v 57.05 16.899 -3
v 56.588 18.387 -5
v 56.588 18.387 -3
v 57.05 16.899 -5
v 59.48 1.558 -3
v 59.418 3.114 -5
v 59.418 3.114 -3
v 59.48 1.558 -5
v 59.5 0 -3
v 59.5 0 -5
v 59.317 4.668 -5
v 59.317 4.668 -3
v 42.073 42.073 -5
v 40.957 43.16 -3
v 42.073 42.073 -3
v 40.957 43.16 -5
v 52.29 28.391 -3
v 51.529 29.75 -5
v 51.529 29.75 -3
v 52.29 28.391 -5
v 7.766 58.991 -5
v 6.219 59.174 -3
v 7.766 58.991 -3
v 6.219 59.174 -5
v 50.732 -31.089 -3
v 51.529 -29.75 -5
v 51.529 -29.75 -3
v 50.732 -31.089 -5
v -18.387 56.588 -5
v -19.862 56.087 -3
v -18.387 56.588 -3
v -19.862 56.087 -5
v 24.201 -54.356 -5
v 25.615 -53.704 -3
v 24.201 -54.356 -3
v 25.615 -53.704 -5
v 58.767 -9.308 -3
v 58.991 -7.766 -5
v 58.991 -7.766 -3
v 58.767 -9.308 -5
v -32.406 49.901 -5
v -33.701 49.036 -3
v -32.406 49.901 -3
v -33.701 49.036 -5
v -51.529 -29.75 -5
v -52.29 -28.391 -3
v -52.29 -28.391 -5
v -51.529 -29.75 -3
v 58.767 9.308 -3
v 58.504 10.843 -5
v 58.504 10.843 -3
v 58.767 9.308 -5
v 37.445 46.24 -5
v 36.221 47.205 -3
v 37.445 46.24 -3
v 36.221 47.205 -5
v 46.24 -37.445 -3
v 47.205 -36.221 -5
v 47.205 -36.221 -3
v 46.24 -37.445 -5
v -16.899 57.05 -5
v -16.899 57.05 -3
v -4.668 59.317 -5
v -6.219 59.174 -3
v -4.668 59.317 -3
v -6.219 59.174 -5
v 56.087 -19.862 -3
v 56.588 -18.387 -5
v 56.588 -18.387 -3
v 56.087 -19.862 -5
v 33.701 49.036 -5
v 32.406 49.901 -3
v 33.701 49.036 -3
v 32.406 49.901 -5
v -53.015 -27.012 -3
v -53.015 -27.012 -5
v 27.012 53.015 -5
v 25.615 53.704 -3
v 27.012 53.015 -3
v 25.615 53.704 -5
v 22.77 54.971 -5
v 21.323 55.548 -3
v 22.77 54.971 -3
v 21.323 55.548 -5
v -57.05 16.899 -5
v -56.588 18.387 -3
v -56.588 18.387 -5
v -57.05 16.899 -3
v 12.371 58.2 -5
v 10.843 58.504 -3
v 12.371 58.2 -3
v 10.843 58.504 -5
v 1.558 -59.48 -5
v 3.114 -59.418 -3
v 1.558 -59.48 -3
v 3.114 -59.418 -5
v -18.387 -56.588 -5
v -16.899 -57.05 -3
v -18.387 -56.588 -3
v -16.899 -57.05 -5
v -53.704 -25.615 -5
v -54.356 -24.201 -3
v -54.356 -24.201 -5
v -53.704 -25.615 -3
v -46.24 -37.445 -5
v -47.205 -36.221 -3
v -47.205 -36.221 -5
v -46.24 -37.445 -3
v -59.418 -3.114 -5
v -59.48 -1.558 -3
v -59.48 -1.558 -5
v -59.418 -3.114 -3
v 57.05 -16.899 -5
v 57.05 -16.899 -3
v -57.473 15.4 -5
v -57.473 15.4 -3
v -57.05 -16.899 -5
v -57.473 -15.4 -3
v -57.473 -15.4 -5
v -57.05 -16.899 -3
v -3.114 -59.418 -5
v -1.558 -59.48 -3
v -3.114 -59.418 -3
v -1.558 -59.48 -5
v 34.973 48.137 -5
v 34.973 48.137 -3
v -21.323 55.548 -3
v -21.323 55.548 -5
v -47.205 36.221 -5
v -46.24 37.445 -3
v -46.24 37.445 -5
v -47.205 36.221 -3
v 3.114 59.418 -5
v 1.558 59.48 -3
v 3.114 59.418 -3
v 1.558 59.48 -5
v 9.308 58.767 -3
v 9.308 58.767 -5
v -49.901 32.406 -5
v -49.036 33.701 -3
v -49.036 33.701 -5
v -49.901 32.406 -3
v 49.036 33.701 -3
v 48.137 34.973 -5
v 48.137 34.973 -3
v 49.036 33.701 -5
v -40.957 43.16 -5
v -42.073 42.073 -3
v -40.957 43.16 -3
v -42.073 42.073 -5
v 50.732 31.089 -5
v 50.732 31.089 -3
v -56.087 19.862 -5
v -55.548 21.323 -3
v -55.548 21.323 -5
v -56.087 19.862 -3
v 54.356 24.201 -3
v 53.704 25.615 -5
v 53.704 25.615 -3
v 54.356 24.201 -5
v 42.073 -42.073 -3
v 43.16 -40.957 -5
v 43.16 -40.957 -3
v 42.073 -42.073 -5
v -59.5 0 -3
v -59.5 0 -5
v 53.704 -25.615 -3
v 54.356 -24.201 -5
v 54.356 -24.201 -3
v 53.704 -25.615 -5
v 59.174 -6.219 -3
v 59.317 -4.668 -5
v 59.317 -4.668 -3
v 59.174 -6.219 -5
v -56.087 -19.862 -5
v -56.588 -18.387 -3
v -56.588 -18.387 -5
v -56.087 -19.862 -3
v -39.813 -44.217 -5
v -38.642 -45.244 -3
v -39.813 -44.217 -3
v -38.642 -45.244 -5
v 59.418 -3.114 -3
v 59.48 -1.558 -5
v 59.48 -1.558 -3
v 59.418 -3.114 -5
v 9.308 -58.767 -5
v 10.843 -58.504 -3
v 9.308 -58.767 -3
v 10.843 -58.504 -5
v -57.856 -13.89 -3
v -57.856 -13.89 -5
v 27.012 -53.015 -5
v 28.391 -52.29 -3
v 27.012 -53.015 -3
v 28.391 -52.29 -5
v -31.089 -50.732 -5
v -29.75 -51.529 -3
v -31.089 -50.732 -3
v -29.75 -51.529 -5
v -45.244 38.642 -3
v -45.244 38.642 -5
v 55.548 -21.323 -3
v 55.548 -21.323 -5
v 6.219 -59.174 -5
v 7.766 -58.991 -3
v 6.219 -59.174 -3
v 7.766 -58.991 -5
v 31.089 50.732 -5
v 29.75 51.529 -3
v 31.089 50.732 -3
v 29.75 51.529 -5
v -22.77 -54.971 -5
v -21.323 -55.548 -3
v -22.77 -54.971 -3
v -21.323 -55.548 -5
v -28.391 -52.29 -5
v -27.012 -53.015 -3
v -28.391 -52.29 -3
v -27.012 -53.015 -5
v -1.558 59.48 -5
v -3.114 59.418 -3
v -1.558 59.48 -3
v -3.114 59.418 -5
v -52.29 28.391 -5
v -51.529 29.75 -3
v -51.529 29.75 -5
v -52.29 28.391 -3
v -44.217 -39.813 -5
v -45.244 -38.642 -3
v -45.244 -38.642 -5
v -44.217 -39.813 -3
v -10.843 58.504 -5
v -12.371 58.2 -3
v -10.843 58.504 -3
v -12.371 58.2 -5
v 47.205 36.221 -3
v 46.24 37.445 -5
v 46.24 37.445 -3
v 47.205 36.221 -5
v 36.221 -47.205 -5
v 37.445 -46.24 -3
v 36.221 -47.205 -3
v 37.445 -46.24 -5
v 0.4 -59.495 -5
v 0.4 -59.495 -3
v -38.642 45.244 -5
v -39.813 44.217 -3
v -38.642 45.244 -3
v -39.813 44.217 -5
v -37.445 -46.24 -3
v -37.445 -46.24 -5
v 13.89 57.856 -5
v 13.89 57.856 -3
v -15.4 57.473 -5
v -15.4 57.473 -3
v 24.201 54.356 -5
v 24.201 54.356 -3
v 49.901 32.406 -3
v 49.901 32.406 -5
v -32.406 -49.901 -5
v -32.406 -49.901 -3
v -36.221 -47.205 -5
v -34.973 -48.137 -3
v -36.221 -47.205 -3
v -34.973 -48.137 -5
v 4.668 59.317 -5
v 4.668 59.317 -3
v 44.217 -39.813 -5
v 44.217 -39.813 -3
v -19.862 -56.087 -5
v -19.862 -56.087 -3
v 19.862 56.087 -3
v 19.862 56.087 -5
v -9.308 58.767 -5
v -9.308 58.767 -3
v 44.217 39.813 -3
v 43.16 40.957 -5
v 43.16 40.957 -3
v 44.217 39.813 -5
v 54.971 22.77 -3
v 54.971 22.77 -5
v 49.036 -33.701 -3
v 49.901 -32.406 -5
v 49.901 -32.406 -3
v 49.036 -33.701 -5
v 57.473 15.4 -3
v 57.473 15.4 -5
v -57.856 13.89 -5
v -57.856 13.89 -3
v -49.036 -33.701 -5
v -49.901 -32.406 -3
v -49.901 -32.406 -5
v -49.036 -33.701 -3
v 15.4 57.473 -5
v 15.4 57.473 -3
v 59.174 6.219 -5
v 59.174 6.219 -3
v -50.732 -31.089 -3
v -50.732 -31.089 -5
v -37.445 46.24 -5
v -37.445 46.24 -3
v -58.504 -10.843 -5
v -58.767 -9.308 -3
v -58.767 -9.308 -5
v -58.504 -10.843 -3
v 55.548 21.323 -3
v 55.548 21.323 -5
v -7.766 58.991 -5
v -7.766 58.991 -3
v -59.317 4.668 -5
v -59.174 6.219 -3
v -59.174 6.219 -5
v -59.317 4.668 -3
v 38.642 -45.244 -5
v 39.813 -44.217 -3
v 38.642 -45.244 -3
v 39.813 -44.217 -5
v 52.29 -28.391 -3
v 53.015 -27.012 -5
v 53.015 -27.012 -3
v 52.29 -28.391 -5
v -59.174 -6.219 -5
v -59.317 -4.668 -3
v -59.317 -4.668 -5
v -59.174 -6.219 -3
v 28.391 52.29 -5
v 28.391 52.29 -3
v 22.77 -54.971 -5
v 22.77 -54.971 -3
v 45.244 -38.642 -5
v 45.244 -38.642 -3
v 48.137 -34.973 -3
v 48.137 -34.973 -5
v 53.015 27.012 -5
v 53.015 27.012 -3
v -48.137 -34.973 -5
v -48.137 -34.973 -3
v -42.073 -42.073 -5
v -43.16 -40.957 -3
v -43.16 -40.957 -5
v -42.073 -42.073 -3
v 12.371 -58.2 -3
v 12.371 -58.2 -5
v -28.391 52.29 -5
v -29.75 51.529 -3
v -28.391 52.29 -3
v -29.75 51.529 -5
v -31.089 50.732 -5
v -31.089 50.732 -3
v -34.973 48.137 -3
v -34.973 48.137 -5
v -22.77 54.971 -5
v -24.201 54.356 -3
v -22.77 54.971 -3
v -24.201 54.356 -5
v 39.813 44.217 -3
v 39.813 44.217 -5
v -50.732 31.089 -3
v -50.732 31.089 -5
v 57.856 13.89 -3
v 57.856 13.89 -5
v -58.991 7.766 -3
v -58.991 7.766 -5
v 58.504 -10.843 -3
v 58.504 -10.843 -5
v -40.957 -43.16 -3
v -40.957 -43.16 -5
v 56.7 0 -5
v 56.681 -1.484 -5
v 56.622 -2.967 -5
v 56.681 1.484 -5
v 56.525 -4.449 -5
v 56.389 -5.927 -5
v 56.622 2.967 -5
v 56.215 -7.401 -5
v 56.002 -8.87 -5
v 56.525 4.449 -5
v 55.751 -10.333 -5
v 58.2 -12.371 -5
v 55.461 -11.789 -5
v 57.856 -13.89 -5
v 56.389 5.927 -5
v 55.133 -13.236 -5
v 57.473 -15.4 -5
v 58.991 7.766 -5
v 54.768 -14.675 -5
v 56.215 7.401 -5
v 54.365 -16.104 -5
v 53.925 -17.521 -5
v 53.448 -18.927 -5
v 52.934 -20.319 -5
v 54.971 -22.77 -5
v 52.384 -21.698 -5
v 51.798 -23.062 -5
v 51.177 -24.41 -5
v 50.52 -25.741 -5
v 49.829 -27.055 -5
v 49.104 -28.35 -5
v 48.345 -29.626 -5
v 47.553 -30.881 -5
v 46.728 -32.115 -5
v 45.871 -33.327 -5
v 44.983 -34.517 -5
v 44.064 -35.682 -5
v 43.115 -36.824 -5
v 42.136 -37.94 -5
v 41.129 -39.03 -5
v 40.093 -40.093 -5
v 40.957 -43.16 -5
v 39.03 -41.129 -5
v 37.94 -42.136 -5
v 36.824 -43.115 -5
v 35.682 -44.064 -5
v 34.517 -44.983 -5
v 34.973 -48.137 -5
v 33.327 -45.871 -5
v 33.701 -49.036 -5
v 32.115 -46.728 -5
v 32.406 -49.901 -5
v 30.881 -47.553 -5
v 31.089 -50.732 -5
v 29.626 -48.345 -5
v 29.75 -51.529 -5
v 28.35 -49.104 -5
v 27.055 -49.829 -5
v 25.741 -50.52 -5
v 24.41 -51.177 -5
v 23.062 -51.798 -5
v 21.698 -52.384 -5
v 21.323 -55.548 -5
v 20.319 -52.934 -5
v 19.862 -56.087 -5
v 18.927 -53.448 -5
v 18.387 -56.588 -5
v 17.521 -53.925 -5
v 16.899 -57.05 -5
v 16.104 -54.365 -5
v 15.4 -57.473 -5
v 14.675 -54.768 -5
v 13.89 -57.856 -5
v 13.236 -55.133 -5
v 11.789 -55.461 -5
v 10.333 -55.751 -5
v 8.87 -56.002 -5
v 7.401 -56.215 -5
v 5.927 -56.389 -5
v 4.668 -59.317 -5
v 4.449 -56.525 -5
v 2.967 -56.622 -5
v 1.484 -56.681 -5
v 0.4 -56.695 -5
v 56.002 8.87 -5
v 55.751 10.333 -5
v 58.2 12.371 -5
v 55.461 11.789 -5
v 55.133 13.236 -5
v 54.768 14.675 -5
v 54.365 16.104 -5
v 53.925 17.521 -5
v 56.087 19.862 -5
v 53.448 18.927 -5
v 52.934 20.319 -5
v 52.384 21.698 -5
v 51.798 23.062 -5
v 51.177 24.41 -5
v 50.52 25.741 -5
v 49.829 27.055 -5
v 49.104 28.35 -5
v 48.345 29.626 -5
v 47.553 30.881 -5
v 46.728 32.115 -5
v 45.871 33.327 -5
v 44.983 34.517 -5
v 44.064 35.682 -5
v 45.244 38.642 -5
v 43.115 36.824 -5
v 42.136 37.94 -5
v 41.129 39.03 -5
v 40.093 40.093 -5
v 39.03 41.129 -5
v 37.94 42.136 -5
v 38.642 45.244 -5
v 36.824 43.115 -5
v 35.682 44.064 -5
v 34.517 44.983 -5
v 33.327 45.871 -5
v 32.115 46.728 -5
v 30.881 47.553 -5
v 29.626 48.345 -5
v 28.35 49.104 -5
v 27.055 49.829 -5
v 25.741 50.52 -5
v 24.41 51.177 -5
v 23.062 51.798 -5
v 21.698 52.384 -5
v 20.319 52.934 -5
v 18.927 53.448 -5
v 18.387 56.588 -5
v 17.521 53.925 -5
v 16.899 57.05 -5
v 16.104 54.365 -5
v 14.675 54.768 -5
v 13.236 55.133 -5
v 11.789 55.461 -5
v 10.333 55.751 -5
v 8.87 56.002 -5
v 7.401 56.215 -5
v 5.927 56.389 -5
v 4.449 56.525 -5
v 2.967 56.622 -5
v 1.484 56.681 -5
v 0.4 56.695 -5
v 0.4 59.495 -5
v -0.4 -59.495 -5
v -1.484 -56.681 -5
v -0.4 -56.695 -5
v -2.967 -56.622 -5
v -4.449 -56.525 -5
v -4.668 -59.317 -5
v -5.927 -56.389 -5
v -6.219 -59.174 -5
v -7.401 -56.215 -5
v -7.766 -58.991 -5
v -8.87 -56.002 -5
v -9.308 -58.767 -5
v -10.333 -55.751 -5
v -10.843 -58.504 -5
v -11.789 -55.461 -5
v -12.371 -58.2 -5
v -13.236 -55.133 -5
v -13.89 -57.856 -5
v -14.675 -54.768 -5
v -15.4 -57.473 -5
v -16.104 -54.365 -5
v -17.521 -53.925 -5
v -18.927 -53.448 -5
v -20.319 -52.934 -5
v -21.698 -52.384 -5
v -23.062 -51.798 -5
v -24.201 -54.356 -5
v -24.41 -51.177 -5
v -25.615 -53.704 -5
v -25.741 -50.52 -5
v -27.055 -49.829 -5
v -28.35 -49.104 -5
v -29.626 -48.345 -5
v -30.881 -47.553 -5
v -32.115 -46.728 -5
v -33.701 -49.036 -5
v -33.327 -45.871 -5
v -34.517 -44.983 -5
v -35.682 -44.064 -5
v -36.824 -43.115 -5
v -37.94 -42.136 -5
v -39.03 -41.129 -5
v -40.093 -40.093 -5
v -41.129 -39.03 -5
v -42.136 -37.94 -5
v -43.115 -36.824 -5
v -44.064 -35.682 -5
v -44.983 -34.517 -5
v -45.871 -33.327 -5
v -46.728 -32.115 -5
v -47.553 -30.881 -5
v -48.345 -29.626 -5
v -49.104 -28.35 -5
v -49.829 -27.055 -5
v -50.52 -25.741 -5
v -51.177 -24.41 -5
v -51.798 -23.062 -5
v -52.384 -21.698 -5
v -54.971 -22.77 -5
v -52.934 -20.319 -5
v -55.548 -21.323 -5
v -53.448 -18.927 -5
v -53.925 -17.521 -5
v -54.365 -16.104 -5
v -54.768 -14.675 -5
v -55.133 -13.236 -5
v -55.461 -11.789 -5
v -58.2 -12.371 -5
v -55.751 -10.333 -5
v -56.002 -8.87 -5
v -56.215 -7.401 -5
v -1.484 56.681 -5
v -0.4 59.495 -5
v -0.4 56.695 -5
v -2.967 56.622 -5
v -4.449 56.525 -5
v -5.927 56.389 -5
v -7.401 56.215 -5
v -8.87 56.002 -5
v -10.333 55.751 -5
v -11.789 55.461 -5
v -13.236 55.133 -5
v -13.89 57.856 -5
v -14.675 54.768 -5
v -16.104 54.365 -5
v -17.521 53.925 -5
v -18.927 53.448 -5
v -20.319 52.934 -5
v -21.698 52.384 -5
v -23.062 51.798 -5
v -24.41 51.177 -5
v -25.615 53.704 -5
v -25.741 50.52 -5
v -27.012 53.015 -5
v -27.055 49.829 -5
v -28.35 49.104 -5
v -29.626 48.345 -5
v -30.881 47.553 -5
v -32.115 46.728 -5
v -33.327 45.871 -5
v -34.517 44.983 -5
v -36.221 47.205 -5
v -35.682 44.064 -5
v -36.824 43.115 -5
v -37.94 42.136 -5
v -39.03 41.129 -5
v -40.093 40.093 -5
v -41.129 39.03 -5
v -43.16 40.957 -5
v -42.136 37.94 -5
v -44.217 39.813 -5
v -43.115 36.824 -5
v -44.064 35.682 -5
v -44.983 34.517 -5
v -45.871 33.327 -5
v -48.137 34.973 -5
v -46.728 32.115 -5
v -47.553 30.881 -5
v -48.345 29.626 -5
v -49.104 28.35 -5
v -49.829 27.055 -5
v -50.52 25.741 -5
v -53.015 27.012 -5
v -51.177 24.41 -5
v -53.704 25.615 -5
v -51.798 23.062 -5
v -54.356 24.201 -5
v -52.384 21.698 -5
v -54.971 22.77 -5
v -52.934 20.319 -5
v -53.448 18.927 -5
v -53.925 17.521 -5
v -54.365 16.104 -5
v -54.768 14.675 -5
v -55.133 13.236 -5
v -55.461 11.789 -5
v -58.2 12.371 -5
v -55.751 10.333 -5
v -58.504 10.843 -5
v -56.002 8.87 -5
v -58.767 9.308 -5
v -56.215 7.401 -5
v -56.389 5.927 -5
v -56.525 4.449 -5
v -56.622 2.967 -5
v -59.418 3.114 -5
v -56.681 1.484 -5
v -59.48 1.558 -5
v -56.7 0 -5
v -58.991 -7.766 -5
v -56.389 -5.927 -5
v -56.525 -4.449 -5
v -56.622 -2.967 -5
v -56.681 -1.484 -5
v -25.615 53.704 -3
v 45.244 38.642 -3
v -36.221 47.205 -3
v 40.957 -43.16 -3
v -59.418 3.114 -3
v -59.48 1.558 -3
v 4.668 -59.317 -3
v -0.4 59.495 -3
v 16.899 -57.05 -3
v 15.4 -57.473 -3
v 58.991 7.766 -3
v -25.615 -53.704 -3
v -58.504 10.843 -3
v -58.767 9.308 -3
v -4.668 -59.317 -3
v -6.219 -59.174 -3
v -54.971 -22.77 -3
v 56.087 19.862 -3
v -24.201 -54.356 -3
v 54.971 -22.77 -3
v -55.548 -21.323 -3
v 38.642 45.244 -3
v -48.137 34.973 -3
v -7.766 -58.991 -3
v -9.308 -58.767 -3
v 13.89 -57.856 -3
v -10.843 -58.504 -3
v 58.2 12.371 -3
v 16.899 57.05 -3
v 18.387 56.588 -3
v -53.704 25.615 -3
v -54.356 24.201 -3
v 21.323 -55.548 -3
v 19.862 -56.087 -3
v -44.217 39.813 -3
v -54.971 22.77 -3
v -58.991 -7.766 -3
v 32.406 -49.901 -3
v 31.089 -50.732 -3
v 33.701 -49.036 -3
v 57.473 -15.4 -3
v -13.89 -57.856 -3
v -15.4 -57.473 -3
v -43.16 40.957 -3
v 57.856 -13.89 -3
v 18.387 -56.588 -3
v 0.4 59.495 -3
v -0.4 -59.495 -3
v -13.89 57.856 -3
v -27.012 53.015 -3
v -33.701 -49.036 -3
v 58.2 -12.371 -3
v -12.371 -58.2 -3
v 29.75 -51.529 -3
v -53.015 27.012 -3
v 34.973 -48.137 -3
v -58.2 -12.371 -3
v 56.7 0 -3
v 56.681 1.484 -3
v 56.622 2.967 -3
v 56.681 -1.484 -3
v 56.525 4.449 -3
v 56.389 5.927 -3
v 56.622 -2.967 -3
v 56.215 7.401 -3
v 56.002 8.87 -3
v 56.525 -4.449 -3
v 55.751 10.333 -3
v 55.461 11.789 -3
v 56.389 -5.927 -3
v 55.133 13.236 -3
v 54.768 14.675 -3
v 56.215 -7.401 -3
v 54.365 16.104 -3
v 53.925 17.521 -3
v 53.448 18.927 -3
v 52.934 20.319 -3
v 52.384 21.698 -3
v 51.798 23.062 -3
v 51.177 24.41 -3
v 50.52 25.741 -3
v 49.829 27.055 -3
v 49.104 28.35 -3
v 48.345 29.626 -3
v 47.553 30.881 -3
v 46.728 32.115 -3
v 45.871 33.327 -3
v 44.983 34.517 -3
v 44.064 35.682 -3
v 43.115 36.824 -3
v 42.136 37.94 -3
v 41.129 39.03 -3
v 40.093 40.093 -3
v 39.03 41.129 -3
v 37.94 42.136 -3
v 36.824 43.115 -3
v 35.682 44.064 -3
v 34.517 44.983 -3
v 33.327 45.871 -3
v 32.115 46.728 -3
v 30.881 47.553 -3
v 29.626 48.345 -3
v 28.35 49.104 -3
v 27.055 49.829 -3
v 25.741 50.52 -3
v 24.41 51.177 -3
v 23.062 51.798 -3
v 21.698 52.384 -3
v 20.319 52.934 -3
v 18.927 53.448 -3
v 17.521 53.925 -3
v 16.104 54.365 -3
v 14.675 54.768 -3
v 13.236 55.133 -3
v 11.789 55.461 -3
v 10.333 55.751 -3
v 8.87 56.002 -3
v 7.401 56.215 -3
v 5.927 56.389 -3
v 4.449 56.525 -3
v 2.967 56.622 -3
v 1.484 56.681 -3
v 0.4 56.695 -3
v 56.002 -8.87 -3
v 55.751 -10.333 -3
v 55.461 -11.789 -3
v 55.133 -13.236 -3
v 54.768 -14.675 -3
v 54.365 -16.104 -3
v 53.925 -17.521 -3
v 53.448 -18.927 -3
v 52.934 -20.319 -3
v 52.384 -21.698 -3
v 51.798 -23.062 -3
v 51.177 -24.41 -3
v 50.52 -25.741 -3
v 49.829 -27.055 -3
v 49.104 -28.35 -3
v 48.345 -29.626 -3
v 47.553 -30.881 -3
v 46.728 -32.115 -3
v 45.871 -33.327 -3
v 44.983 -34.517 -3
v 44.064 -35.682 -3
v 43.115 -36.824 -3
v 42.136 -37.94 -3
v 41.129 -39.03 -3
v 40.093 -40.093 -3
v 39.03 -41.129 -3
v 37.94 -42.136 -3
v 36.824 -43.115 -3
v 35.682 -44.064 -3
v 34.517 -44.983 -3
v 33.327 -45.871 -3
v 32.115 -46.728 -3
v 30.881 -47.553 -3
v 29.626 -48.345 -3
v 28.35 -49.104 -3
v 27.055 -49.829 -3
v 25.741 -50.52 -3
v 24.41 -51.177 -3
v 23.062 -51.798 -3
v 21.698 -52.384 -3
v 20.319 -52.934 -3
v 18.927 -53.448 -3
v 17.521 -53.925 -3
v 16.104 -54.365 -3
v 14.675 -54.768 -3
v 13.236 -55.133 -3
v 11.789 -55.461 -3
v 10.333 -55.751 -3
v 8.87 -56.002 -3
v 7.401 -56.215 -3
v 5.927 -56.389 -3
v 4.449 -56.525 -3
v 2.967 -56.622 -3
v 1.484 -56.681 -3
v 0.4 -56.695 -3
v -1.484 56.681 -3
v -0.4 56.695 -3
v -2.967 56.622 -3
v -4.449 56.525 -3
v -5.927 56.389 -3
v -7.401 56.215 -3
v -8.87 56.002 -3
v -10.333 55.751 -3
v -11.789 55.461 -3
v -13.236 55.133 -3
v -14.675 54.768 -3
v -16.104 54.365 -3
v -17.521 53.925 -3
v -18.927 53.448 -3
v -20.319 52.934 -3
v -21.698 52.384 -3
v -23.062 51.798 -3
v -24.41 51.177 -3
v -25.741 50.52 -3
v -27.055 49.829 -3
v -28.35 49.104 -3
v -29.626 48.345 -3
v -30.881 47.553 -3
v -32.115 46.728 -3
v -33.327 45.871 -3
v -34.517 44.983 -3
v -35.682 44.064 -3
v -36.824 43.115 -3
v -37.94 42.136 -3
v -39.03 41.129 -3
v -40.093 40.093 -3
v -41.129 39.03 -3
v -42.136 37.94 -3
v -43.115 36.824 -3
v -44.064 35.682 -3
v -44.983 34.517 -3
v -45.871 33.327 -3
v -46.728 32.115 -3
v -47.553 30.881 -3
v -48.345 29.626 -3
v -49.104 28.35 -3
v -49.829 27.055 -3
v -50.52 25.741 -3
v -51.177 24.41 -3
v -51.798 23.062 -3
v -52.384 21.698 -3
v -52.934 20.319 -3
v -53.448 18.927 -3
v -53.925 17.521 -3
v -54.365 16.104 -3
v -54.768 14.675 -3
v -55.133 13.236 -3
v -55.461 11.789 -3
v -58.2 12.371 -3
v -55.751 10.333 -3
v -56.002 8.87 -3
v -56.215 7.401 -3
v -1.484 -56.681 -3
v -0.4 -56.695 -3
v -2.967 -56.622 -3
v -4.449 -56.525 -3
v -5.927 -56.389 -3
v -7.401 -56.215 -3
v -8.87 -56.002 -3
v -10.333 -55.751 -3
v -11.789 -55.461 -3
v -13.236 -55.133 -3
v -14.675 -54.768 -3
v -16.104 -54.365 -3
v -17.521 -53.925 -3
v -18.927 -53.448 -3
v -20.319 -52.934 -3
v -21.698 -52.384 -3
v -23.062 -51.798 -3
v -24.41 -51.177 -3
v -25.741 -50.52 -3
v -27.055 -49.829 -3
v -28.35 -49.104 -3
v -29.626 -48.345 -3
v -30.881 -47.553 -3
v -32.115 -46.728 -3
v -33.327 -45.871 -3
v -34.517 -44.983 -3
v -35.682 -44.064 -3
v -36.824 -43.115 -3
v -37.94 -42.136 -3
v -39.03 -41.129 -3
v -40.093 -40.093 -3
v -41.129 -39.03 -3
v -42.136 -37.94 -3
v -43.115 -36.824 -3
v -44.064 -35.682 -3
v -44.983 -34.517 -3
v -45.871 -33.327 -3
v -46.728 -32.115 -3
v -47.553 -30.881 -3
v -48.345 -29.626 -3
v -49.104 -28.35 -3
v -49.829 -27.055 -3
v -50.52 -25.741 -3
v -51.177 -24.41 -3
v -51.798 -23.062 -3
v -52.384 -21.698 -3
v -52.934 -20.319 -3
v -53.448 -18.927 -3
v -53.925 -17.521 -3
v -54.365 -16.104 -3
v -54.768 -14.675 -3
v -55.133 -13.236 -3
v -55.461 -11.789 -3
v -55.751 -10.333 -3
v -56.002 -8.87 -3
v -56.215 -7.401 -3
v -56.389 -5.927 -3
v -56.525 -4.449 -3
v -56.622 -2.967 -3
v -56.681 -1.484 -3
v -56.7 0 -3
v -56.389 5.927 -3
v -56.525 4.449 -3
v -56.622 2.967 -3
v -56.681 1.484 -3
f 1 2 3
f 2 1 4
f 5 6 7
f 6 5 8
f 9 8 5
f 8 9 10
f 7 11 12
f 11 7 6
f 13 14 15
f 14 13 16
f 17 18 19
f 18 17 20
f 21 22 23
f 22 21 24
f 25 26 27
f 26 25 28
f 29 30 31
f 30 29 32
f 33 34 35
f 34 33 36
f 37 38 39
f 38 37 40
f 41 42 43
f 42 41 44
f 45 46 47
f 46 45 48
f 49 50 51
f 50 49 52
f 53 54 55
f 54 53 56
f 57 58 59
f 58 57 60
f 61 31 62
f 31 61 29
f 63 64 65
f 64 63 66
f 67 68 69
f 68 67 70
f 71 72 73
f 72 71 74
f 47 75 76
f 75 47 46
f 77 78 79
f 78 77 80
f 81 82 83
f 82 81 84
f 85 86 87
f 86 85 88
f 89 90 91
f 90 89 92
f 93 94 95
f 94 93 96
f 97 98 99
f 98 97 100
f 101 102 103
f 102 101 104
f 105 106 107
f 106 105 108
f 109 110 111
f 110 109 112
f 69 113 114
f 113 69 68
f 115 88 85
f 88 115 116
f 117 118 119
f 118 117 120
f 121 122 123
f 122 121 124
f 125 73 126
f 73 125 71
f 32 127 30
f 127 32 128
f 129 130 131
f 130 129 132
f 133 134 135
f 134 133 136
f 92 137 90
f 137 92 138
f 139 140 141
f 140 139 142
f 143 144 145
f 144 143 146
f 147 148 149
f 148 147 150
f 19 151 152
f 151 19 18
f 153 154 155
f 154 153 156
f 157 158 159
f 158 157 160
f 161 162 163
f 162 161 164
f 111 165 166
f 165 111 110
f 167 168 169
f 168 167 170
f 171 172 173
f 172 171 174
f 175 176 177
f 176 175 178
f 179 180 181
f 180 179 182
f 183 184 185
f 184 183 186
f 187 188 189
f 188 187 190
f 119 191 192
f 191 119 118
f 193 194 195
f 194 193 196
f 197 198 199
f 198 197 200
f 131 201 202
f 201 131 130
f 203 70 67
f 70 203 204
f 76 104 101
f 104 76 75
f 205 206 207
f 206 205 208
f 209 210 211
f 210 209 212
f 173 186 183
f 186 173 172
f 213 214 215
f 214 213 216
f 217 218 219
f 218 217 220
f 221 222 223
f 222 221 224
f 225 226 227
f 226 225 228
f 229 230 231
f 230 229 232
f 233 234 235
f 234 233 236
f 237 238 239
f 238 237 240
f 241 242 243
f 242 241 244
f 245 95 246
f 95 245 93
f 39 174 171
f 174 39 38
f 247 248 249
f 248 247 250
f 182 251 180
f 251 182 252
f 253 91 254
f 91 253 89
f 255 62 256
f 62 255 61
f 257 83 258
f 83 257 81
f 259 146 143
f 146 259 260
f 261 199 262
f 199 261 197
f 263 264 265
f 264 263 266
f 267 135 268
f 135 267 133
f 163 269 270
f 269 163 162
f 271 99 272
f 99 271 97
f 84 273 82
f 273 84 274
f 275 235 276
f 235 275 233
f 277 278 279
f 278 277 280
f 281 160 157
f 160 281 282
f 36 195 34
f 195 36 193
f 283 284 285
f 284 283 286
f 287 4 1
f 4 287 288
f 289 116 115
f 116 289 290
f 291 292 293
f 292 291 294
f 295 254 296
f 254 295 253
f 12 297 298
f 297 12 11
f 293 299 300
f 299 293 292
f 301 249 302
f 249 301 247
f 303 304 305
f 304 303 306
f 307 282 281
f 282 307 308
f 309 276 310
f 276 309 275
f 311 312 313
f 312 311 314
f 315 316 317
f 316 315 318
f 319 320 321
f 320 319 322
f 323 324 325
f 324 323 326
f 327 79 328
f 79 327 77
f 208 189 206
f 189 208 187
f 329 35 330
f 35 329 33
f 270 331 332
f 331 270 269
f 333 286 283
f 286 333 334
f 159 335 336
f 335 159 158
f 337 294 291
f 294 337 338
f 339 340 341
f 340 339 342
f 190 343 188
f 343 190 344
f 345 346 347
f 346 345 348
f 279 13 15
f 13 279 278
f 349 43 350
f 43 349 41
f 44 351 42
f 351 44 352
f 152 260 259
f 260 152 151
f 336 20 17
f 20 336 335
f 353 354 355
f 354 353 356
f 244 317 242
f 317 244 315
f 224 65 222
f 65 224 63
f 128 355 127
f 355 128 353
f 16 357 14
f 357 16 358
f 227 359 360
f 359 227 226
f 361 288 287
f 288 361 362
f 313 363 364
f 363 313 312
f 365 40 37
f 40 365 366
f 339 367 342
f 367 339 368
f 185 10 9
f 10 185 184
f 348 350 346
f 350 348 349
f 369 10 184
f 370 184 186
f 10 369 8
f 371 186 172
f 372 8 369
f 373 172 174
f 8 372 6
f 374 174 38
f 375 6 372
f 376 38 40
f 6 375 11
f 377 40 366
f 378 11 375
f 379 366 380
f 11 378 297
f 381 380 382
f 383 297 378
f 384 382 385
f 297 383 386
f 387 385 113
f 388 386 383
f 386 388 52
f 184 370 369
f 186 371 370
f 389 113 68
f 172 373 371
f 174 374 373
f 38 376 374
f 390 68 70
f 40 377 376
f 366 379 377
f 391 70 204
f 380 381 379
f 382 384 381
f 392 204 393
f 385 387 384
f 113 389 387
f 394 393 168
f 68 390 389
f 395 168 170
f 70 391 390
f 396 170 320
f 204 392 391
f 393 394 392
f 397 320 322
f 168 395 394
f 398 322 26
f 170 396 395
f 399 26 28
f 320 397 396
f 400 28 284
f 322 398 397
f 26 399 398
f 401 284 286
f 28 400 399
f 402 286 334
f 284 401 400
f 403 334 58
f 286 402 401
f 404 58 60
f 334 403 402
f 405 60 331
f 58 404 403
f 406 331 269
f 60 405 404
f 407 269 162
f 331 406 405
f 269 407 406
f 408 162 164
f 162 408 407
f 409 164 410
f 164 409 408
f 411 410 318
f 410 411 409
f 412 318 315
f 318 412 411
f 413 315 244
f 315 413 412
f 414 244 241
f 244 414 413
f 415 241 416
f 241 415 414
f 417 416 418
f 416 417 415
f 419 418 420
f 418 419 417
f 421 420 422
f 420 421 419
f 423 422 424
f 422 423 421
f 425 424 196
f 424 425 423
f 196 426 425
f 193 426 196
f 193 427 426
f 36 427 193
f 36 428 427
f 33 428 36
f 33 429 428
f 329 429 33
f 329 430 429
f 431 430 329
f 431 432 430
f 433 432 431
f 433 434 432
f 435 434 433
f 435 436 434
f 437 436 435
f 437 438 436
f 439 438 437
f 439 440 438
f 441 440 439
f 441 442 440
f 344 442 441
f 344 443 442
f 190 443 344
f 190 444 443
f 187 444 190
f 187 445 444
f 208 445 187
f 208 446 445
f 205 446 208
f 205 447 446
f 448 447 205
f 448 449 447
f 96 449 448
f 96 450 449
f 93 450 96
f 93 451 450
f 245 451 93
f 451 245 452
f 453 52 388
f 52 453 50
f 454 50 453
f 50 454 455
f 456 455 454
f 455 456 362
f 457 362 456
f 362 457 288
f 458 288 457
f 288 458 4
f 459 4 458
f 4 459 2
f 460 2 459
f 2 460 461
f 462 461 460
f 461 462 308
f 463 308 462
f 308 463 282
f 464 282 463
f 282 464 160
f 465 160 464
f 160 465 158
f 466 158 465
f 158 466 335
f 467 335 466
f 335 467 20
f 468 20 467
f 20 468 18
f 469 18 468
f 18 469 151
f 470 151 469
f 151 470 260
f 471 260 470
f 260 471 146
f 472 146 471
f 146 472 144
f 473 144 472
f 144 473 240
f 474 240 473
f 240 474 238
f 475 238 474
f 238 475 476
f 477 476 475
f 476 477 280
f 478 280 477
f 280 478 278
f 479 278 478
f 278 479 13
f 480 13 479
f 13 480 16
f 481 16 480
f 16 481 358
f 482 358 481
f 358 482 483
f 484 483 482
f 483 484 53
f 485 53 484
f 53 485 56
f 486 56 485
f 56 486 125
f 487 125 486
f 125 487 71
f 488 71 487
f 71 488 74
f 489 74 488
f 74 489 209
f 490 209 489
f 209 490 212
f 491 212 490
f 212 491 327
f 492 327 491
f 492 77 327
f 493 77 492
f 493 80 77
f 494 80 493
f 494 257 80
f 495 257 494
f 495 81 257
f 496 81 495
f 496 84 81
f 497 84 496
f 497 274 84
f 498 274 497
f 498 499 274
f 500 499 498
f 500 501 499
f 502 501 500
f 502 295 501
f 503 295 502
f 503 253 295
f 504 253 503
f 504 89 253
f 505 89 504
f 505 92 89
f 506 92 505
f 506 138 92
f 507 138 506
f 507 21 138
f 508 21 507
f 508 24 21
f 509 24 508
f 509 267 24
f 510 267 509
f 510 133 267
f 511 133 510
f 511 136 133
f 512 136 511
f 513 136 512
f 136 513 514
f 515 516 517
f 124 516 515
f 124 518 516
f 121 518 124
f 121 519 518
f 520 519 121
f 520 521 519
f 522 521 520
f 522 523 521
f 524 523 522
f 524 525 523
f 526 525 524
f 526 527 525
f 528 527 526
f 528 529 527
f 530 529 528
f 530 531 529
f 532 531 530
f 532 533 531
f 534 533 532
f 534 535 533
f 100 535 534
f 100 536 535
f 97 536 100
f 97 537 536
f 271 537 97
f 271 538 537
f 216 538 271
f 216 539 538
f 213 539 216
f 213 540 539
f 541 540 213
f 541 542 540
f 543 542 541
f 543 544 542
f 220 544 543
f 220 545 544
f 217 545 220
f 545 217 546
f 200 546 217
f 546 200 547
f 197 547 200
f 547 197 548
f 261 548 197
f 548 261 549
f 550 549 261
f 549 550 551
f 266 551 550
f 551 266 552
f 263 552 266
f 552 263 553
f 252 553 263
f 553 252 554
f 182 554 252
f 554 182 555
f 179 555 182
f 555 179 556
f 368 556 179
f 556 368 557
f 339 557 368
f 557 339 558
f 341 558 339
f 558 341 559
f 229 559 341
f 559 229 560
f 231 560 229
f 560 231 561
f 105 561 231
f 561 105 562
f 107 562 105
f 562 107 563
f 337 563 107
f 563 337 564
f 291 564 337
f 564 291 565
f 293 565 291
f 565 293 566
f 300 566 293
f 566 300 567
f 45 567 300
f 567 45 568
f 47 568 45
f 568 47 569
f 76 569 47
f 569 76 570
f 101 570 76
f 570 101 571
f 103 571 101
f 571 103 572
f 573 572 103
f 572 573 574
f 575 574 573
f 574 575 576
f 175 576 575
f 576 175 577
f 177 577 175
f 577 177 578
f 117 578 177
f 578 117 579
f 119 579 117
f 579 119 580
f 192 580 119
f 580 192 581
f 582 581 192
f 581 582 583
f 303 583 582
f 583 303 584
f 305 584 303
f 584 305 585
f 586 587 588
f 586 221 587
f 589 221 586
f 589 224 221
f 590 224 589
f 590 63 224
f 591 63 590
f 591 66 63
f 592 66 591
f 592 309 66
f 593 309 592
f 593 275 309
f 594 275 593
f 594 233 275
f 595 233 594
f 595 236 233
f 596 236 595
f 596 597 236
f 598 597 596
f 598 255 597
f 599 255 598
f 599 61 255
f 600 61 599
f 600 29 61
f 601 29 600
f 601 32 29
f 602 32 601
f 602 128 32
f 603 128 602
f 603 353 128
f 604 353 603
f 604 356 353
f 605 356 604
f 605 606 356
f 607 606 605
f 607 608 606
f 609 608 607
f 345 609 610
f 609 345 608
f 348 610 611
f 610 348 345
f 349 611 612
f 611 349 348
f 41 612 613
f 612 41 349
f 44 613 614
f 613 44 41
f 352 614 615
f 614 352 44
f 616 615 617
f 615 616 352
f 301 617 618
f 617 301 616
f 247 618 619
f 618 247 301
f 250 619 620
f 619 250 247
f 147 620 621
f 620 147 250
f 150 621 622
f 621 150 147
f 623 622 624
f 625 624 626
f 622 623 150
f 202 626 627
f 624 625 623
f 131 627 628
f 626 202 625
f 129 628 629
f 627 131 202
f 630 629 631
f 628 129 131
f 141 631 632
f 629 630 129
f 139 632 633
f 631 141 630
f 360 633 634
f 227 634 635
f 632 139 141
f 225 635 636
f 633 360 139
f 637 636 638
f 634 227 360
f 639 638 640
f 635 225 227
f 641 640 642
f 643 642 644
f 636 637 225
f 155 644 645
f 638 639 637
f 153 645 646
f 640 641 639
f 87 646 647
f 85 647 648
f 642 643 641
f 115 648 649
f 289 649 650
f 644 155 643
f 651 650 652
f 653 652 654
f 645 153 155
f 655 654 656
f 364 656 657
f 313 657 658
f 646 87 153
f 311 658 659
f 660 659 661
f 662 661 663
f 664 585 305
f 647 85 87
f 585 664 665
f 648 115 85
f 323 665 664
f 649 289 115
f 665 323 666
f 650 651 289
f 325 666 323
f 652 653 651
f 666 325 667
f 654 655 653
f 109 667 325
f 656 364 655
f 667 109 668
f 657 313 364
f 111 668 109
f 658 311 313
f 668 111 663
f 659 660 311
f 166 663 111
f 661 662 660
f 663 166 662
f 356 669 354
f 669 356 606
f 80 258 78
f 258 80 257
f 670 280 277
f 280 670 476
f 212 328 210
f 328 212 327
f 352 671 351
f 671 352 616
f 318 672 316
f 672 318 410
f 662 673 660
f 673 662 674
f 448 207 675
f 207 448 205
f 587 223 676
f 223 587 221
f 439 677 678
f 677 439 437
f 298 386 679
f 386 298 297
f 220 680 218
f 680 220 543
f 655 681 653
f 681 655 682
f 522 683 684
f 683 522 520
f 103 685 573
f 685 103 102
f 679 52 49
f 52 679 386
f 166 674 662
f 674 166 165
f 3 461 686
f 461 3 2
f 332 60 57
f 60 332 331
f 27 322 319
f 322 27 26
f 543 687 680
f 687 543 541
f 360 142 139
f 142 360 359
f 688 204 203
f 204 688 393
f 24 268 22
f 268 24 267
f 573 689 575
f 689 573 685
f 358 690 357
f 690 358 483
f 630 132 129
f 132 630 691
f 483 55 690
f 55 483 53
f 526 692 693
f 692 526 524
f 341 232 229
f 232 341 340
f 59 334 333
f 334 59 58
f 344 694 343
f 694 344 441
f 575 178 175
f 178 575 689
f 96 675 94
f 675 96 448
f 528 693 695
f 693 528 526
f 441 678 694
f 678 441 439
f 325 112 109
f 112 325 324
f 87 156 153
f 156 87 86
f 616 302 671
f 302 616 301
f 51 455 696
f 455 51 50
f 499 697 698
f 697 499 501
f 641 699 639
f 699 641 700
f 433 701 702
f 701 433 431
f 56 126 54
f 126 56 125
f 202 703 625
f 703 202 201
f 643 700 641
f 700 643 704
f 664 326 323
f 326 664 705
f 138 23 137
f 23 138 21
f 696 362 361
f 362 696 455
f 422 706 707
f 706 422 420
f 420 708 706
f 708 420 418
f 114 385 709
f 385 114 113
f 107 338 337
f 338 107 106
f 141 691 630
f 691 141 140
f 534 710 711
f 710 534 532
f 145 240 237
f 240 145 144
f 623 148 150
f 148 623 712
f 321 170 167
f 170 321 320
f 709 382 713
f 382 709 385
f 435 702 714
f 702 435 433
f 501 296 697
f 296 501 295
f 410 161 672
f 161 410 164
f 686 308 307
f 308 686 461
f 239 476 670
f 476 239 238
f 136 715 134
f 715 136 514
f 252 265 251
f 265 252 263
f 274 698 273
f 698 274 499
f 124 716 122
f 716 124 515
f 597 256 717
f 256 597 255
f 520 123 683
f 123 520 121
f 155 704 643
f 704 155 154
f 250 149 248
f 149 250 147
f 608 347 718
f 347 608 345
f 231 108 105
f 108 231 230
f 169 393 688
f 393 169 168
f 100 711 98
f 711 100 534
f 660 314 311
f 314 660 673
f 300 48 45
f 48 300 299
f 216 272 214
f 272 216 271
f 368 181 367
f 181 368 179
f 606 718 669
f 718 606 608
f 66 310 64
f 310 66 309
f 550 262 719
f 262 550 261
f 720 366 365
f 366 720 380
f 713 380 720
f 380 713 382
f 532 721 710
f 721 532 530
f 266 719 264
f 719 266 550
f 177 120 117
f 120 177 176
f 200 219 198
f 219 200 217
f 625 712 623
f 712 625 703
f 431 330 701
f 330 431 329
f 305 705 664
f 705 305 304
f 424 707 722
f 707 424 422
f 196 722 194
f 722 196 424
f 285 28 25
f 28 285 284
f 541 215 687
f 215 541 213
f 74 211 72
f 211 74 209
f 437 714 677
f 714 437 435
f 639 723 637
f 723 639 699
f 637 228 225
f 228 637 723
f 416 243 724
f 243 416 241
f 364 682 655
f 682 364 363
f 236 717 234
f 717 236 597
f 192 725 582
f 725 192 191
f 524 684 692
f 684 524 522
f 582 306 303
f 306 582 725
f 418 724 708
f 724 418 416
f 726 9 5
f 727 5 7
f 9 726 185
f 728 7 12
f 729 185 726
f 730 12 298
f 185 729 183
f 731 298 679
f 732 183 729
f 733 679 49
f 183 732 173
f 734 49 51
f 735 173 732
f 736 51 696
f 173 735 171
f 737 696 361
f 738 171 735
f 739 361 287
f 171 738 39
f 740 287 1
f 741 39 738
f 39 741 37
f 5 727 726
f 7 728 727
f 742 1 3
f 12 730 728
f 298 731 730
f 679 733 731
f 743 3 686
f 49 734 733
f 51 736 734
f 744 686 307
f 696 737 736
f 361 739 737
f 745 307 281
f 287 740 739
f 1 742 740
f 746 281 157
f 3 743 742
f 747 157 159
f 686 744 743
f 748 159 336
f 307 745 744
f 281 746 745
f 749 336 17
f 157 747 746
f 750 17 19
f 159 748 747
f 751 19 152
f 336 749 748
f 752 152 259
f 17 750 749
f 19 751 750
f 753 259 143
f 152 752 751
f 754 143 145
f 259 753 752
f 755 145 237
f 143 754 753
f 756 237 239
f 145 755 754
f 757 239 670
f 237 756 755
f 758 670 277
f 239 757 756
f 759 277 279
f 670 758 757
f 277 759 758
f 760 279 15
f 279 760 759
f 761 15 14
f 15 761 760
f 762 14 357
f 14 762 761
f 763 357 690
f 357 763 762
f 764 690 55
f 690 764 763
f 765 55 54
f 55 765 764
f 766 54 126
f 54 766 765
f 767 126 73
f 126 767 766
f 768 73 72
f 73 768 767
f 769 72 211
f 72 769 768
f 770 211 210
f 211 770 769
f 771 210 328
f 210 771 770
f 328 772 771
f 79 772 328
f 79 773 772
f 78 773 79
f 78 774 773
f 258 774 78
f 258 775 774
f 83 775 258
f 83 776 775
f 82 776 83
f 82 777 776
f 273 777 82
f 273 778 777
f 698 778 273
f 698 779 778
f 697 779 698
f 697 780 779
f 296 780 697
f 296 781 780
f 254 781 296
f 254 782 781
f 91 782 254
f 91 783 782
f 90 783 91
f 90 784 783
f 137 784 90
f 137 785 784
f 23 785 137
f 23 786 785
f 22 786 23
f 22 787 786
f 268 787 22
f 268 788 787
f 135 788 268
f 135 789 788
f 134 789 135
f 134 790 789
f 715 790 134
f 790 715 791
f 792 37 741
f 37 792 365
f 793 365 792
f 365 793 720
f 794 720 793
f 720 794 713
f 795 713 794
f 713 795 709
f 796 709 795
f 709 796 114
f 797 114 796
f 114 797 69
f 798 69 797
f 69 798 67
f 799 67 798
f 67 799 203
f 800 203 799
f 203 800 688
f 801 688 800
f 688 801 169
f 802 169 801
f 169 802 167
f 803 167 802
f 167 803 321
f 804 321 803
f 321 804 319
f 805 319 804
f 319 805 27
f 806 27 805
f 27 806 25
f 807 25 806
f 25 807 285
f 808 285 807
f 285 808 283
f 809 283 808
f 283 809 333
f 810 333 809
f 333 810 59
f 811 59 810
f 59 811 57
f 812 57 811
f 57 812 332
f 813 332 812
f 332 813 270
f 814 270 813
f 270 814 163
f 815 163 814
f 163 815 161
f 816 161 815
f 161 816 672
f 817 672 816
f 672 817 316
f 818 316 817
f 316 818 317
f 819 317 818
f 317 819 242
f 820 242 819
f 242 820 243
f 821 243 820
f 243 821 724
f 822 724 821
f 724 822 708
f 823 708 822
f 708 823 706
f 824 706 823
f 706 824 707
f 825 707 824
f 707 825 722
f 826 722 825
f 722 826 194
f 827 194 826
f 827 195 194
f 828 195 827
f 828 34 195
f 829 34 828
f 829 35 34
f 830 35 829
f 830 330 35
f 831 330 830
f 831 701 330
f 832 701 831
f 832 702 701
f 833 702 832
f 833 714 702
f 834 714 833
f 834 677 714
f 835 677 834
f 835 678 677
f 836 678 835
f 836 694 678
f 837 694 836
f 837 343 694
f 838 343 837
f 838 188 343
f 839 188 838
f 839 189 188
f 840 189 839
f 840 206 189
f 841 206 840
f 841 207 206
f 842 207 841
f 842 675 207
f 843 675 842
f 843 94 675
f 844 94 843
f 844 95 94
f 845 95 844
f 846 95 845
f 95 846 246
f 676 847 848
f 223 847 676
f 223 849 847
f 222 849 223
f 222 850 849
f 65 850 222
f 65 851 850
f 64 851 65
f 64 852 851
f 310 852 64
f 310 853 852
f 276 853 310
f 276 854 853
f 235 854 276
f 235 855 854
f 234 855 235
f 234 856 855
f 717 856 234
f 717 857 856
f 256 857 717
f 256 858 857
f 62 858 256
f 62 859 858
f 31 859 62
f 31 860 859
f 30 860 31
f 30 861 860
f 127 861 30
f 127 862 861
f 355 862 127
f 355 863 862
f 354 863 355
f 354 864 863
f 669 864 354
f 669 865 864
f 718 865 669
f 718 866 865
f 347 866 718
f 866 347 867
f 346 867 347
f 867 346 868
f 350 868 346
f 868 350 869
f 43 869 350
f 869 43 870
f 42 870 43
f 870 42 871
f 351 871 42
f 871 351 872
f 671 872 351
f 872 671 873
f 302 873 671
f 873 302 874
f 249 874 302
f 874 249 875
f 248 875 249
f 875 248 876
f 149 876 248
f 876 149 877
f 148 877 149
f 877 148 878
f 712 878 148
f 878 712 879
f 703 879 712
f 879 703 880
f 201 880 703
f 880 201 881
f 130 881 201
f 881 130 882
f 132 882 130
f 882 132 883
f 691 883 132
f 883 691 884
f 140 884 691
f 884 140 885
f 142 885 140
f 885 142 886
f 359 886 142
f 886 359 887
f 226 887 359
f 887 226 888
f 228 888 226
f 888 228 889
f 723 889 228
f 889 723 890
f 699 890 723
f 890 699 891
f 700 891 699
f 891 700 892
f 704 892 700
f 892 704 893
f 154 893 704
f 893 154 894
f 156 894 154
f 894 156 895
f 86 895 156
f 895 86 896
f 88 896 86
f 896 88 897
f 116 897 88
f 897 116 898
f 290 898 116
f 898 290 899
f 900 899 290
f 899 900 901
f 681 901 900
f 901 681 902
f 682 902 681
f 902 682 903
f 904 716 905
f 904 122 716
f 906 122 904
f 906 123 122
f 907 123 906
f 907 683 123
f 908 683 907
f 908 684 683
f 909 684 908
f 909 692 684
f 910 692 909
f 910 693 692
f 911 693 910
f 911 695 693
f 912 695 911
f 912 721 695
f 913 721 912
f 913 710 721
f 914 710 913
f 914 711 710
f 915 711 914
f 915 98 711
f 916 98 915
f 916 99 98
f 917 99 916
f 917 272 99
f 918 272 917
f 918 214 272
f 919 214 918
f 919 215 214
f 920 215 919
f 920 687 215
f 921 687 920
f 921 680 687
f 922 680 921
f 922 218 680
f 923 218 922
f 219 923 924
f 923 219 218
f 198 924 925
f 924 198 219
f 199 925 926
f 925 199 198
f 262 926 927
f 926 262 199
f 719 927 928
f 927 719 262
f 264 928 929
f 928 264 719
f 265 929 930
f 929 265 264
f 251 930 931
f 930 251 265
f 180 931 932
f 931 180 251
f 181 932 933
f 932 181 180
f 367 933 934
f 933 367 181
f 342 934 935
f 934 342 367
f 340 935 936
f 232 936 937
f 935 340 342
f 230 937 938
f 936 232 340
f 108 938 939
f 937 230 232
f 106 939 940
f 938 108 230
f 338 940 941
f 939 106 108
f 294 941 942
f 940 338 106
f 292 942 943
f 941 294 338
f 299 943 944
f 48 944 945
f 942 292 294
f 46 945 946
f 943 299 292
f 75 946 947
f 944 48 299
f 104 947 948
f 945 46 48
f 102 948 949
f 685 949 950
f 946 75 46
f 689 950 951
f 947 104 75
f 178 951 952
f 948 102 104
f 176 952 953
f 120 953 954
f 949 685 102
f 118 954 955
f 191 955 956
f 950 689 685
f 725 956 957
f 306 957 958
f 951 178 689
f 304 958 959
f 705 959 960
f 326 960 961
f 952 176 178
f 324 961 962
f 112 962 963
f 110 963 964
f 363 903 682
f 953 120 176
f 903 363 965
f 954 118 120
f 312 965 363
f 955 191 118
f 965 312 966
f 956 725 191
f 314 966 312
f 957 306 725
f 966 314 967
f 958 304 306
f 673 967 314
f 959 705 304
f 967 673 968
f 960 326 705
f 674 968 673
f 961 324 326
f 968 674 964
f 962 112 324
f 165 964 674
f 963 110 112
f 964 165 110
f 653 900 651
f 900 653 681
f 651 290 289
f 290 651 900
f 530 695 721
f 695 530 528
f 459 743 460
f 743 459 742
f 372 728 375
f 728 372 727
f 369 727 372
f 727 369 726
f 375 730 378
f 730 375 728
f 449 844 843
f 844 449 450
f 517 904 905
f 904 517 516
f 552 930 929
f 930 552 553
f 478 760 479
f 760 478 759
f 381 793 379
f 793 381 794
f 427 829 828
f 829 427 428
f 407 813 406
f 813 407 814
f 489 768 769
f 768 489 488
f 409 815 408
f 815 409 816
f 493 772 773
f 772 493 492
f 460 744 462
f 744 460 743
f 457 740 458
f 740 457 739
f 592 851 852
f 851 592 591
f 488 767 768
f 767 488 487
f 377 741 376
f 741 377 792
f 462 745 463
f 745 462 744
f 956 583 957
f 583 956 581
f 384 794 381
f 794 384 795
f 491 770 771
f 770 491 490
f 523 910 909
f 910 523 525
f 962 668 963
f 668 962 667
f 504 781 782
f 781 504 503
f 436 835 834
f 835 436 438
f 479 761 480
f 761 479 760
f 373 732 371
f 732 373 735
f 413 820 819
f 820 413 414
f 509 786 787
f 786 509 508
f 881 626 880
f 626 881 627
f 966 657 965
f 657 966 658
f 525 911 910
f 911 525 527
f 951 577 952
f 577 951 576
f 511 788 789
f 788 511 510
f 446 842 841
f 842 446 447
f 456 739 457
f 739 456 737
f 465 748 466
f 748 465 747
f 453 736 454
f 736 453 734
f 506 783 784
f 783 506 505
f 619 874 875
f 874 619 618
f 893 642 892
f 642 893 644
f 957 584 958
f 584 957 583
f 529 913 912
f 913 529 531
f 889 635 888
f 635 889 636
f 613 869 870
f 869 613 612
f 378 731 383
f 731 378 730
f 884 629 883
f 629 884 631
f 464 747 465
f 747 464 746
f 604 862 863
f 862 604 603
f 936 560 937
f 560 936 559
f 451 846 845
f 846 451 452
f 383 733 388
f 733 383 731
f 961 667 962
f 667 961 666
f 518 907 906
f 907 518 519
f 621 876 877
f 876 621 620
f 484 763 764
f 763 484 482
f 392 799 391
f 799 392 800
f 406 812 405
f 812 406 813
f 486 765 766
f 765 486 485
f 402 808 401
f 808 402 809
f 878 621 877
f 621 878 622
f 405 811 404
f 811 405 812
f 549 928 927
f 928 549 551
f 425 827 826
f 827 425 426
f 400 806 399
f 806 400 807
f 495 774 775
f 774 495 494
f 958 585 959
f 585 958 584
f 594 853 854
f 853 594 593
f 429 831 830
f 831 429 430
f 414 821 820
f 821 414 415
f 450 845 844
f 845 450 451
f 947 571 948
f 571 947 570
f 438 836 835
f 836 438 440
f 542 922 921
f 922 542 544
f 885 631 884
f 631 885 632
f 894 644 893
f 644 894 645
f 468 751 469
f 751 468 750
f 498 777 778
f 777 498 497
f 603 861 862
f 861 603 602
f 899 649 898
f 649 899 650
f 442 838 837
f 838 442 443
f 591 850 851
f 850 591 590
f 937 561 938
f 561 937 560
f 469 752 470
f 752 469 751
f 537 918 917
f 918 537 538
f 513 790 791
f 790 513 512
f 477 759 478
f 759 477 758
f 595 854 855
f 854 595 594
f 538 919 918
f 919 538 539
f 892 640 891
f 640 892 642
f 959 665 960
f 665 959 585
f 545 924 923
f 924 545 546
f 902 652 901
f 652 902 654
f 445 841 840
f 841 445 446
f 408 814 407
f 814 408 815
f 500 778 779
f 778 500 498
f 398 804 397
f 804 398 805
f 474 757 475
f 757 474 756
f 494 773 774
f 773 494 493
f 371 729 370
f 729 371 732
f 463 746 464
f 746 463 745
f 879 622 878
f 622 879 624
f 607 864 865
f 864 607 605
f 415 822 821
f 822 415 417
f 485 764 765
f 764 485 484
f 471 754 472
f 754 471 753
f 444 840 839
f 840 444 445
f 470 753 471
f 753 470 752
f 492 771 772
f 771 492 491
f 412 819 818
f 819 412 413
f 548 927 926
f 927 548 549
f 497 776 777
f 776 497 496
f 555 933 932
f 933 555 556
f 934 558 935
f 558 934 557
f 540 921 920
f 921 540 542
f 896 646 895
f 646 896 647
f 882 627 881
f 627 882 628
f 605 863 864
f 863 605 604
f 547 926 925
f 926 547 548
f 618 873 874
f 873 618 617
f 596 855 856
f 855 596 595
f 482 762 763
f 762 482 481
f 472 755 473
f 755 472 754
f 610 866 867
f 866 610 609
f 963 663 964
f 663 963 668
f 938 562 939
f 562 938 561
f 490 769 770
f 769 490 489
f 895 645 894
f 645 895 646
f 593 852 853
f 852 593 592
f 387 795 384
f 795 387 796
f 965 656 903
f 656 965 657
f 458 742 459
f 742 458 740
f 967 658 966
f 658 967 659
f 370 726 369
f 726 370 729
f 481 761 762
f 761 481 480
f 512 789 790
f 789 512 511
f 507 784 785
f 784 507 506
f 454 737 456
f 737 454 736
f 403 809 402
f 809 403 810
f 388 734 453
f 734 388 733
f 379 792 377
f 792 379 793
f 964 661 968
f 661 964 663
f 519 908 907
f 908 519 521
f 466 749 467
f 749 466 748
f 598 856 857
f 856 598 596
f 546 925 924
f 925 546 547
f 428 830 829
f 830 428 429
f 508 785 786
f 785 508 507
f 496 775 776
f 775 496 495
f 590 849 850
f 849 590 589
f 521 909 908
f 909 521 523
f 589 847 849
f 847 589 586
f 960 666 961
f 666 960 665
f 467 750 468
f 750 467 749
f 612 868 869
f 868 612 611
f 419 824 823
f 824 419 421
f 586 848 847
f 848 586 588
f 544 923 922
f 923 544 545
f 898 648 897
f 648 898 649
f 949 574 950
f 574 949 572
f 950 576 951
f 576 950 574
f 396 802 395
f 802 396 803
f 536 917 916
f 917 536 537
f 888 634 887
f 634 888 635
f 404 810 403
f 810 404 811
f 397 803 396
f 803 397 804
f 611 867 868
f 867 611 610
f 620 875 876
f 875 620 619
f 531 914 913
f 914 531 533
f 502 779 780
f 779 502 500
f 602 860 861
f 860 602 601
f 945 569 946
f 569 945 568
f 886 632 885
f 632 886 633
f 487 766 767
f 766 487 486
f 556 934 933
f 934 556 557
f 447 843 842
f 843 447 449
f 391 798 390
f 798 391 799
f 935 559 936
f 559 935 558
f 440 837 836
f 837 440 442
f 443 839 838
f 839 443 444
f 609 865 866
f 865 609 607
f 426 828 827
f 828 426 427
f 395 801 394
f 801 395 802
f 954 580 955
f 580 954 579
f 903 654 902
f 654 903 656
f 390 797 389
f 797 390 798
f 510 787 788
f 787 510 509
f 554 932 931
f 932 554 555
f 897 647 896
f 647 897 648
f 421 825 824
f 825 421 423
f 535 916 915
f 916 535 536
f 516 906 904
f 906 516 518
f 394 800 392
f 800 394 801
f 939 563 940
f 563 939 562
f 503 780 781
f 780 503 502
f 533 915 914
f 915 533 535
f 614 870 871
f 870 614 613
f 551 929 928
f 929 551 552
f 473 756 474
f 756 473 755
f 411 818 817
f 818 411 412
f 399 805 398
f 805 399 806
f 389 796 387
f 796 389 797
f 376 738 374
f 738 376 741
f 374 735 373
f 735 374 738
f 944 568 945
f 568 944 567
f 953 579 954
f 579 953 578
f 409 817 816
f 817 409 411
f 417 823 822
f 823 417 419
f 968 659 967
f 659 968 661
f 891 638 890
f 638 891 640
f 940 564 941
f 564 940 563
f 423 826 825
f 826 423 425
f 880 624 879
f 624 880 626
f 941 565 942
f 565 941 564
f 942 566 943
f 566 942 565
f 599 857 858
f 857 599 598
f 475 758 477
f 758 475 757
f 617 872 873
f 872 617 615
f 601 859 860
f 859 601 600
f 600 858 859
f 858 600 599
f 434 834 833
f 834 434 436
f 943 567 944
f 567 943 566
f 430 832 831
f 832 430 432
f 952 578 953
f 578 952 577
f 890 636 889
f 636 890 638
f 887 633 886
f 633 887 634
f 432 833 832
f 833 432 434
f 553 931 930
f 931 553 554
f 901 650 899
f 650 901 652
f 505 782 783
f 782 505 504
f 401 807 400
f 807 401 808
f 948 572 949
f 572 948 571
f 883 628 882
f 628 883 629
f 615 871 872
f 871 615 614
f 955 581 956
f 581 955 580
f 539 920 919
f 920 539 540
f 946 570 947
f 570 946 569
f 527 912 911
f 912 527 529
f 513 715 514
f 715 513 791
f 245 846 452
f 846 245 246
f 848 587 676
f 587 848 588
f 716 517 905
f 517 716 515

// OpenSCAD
// FG-D01 v0.2 - two-piece front trim study, NOT a structural display mount.
// Millimeters; Z is front-to-back. This CAD is a concept, not a cut file.
// The original four-arm carrier supports the display. No glass compression.
// Ring is considered OUTSIDE the continuous transparent guard, subject to review.
$fn=240;
outer_d=119;
inner_d=113.4;
thickness=2.0;
seam=0.8;
guard_thickness=3.0;
display_d=115;
glass_d_max=112.6;
lens_d_max=88.4;
show_envelope=true;
module half(side=1) {
  intersection() {
    difference() {
      cylinder(d=outer_d,h=thickness,center=true);
      cylinder(d=inner_d,h=thickness+0.2,center=true);
    }
    // At x=0 each half ends seam/2 from center; half-space with margin.
    translate([side*(outer_d/2+seam/2),0,0])
      cube([outer_d,outer_d+1,thickness+1],center=true);
  }
}
// z=0 is guard rear face, guard occupies -3..0.
// Display glass front is nominally z=+1.5.
// Ring envelope is outside guard at z=-5..-3, with no display contact.
// Attachment to guard NOT yet designed; no adhesive/fastener authorization.
translate([0,0,-4]) {
  color([0.72,0.49,0.18]) half(1);
  color([0.72,0.49,0.18]) half(-1);
}
if(show_envelope) {
  %translate([0,0,-guard_thickness/2]) cylinder(d=160,h=guard_thickness,center=true);
  %translate([0,0,1.5]) cylinder(d=glass_d_max,h=0.05,center=true);
  %translate([0,0,1.55]) cylinder(d=lens_d_max,h=0.05,center=true);
  %translate([0,0,1.65]) cylinder(d=display_d,h=0.05,center=true);
}
